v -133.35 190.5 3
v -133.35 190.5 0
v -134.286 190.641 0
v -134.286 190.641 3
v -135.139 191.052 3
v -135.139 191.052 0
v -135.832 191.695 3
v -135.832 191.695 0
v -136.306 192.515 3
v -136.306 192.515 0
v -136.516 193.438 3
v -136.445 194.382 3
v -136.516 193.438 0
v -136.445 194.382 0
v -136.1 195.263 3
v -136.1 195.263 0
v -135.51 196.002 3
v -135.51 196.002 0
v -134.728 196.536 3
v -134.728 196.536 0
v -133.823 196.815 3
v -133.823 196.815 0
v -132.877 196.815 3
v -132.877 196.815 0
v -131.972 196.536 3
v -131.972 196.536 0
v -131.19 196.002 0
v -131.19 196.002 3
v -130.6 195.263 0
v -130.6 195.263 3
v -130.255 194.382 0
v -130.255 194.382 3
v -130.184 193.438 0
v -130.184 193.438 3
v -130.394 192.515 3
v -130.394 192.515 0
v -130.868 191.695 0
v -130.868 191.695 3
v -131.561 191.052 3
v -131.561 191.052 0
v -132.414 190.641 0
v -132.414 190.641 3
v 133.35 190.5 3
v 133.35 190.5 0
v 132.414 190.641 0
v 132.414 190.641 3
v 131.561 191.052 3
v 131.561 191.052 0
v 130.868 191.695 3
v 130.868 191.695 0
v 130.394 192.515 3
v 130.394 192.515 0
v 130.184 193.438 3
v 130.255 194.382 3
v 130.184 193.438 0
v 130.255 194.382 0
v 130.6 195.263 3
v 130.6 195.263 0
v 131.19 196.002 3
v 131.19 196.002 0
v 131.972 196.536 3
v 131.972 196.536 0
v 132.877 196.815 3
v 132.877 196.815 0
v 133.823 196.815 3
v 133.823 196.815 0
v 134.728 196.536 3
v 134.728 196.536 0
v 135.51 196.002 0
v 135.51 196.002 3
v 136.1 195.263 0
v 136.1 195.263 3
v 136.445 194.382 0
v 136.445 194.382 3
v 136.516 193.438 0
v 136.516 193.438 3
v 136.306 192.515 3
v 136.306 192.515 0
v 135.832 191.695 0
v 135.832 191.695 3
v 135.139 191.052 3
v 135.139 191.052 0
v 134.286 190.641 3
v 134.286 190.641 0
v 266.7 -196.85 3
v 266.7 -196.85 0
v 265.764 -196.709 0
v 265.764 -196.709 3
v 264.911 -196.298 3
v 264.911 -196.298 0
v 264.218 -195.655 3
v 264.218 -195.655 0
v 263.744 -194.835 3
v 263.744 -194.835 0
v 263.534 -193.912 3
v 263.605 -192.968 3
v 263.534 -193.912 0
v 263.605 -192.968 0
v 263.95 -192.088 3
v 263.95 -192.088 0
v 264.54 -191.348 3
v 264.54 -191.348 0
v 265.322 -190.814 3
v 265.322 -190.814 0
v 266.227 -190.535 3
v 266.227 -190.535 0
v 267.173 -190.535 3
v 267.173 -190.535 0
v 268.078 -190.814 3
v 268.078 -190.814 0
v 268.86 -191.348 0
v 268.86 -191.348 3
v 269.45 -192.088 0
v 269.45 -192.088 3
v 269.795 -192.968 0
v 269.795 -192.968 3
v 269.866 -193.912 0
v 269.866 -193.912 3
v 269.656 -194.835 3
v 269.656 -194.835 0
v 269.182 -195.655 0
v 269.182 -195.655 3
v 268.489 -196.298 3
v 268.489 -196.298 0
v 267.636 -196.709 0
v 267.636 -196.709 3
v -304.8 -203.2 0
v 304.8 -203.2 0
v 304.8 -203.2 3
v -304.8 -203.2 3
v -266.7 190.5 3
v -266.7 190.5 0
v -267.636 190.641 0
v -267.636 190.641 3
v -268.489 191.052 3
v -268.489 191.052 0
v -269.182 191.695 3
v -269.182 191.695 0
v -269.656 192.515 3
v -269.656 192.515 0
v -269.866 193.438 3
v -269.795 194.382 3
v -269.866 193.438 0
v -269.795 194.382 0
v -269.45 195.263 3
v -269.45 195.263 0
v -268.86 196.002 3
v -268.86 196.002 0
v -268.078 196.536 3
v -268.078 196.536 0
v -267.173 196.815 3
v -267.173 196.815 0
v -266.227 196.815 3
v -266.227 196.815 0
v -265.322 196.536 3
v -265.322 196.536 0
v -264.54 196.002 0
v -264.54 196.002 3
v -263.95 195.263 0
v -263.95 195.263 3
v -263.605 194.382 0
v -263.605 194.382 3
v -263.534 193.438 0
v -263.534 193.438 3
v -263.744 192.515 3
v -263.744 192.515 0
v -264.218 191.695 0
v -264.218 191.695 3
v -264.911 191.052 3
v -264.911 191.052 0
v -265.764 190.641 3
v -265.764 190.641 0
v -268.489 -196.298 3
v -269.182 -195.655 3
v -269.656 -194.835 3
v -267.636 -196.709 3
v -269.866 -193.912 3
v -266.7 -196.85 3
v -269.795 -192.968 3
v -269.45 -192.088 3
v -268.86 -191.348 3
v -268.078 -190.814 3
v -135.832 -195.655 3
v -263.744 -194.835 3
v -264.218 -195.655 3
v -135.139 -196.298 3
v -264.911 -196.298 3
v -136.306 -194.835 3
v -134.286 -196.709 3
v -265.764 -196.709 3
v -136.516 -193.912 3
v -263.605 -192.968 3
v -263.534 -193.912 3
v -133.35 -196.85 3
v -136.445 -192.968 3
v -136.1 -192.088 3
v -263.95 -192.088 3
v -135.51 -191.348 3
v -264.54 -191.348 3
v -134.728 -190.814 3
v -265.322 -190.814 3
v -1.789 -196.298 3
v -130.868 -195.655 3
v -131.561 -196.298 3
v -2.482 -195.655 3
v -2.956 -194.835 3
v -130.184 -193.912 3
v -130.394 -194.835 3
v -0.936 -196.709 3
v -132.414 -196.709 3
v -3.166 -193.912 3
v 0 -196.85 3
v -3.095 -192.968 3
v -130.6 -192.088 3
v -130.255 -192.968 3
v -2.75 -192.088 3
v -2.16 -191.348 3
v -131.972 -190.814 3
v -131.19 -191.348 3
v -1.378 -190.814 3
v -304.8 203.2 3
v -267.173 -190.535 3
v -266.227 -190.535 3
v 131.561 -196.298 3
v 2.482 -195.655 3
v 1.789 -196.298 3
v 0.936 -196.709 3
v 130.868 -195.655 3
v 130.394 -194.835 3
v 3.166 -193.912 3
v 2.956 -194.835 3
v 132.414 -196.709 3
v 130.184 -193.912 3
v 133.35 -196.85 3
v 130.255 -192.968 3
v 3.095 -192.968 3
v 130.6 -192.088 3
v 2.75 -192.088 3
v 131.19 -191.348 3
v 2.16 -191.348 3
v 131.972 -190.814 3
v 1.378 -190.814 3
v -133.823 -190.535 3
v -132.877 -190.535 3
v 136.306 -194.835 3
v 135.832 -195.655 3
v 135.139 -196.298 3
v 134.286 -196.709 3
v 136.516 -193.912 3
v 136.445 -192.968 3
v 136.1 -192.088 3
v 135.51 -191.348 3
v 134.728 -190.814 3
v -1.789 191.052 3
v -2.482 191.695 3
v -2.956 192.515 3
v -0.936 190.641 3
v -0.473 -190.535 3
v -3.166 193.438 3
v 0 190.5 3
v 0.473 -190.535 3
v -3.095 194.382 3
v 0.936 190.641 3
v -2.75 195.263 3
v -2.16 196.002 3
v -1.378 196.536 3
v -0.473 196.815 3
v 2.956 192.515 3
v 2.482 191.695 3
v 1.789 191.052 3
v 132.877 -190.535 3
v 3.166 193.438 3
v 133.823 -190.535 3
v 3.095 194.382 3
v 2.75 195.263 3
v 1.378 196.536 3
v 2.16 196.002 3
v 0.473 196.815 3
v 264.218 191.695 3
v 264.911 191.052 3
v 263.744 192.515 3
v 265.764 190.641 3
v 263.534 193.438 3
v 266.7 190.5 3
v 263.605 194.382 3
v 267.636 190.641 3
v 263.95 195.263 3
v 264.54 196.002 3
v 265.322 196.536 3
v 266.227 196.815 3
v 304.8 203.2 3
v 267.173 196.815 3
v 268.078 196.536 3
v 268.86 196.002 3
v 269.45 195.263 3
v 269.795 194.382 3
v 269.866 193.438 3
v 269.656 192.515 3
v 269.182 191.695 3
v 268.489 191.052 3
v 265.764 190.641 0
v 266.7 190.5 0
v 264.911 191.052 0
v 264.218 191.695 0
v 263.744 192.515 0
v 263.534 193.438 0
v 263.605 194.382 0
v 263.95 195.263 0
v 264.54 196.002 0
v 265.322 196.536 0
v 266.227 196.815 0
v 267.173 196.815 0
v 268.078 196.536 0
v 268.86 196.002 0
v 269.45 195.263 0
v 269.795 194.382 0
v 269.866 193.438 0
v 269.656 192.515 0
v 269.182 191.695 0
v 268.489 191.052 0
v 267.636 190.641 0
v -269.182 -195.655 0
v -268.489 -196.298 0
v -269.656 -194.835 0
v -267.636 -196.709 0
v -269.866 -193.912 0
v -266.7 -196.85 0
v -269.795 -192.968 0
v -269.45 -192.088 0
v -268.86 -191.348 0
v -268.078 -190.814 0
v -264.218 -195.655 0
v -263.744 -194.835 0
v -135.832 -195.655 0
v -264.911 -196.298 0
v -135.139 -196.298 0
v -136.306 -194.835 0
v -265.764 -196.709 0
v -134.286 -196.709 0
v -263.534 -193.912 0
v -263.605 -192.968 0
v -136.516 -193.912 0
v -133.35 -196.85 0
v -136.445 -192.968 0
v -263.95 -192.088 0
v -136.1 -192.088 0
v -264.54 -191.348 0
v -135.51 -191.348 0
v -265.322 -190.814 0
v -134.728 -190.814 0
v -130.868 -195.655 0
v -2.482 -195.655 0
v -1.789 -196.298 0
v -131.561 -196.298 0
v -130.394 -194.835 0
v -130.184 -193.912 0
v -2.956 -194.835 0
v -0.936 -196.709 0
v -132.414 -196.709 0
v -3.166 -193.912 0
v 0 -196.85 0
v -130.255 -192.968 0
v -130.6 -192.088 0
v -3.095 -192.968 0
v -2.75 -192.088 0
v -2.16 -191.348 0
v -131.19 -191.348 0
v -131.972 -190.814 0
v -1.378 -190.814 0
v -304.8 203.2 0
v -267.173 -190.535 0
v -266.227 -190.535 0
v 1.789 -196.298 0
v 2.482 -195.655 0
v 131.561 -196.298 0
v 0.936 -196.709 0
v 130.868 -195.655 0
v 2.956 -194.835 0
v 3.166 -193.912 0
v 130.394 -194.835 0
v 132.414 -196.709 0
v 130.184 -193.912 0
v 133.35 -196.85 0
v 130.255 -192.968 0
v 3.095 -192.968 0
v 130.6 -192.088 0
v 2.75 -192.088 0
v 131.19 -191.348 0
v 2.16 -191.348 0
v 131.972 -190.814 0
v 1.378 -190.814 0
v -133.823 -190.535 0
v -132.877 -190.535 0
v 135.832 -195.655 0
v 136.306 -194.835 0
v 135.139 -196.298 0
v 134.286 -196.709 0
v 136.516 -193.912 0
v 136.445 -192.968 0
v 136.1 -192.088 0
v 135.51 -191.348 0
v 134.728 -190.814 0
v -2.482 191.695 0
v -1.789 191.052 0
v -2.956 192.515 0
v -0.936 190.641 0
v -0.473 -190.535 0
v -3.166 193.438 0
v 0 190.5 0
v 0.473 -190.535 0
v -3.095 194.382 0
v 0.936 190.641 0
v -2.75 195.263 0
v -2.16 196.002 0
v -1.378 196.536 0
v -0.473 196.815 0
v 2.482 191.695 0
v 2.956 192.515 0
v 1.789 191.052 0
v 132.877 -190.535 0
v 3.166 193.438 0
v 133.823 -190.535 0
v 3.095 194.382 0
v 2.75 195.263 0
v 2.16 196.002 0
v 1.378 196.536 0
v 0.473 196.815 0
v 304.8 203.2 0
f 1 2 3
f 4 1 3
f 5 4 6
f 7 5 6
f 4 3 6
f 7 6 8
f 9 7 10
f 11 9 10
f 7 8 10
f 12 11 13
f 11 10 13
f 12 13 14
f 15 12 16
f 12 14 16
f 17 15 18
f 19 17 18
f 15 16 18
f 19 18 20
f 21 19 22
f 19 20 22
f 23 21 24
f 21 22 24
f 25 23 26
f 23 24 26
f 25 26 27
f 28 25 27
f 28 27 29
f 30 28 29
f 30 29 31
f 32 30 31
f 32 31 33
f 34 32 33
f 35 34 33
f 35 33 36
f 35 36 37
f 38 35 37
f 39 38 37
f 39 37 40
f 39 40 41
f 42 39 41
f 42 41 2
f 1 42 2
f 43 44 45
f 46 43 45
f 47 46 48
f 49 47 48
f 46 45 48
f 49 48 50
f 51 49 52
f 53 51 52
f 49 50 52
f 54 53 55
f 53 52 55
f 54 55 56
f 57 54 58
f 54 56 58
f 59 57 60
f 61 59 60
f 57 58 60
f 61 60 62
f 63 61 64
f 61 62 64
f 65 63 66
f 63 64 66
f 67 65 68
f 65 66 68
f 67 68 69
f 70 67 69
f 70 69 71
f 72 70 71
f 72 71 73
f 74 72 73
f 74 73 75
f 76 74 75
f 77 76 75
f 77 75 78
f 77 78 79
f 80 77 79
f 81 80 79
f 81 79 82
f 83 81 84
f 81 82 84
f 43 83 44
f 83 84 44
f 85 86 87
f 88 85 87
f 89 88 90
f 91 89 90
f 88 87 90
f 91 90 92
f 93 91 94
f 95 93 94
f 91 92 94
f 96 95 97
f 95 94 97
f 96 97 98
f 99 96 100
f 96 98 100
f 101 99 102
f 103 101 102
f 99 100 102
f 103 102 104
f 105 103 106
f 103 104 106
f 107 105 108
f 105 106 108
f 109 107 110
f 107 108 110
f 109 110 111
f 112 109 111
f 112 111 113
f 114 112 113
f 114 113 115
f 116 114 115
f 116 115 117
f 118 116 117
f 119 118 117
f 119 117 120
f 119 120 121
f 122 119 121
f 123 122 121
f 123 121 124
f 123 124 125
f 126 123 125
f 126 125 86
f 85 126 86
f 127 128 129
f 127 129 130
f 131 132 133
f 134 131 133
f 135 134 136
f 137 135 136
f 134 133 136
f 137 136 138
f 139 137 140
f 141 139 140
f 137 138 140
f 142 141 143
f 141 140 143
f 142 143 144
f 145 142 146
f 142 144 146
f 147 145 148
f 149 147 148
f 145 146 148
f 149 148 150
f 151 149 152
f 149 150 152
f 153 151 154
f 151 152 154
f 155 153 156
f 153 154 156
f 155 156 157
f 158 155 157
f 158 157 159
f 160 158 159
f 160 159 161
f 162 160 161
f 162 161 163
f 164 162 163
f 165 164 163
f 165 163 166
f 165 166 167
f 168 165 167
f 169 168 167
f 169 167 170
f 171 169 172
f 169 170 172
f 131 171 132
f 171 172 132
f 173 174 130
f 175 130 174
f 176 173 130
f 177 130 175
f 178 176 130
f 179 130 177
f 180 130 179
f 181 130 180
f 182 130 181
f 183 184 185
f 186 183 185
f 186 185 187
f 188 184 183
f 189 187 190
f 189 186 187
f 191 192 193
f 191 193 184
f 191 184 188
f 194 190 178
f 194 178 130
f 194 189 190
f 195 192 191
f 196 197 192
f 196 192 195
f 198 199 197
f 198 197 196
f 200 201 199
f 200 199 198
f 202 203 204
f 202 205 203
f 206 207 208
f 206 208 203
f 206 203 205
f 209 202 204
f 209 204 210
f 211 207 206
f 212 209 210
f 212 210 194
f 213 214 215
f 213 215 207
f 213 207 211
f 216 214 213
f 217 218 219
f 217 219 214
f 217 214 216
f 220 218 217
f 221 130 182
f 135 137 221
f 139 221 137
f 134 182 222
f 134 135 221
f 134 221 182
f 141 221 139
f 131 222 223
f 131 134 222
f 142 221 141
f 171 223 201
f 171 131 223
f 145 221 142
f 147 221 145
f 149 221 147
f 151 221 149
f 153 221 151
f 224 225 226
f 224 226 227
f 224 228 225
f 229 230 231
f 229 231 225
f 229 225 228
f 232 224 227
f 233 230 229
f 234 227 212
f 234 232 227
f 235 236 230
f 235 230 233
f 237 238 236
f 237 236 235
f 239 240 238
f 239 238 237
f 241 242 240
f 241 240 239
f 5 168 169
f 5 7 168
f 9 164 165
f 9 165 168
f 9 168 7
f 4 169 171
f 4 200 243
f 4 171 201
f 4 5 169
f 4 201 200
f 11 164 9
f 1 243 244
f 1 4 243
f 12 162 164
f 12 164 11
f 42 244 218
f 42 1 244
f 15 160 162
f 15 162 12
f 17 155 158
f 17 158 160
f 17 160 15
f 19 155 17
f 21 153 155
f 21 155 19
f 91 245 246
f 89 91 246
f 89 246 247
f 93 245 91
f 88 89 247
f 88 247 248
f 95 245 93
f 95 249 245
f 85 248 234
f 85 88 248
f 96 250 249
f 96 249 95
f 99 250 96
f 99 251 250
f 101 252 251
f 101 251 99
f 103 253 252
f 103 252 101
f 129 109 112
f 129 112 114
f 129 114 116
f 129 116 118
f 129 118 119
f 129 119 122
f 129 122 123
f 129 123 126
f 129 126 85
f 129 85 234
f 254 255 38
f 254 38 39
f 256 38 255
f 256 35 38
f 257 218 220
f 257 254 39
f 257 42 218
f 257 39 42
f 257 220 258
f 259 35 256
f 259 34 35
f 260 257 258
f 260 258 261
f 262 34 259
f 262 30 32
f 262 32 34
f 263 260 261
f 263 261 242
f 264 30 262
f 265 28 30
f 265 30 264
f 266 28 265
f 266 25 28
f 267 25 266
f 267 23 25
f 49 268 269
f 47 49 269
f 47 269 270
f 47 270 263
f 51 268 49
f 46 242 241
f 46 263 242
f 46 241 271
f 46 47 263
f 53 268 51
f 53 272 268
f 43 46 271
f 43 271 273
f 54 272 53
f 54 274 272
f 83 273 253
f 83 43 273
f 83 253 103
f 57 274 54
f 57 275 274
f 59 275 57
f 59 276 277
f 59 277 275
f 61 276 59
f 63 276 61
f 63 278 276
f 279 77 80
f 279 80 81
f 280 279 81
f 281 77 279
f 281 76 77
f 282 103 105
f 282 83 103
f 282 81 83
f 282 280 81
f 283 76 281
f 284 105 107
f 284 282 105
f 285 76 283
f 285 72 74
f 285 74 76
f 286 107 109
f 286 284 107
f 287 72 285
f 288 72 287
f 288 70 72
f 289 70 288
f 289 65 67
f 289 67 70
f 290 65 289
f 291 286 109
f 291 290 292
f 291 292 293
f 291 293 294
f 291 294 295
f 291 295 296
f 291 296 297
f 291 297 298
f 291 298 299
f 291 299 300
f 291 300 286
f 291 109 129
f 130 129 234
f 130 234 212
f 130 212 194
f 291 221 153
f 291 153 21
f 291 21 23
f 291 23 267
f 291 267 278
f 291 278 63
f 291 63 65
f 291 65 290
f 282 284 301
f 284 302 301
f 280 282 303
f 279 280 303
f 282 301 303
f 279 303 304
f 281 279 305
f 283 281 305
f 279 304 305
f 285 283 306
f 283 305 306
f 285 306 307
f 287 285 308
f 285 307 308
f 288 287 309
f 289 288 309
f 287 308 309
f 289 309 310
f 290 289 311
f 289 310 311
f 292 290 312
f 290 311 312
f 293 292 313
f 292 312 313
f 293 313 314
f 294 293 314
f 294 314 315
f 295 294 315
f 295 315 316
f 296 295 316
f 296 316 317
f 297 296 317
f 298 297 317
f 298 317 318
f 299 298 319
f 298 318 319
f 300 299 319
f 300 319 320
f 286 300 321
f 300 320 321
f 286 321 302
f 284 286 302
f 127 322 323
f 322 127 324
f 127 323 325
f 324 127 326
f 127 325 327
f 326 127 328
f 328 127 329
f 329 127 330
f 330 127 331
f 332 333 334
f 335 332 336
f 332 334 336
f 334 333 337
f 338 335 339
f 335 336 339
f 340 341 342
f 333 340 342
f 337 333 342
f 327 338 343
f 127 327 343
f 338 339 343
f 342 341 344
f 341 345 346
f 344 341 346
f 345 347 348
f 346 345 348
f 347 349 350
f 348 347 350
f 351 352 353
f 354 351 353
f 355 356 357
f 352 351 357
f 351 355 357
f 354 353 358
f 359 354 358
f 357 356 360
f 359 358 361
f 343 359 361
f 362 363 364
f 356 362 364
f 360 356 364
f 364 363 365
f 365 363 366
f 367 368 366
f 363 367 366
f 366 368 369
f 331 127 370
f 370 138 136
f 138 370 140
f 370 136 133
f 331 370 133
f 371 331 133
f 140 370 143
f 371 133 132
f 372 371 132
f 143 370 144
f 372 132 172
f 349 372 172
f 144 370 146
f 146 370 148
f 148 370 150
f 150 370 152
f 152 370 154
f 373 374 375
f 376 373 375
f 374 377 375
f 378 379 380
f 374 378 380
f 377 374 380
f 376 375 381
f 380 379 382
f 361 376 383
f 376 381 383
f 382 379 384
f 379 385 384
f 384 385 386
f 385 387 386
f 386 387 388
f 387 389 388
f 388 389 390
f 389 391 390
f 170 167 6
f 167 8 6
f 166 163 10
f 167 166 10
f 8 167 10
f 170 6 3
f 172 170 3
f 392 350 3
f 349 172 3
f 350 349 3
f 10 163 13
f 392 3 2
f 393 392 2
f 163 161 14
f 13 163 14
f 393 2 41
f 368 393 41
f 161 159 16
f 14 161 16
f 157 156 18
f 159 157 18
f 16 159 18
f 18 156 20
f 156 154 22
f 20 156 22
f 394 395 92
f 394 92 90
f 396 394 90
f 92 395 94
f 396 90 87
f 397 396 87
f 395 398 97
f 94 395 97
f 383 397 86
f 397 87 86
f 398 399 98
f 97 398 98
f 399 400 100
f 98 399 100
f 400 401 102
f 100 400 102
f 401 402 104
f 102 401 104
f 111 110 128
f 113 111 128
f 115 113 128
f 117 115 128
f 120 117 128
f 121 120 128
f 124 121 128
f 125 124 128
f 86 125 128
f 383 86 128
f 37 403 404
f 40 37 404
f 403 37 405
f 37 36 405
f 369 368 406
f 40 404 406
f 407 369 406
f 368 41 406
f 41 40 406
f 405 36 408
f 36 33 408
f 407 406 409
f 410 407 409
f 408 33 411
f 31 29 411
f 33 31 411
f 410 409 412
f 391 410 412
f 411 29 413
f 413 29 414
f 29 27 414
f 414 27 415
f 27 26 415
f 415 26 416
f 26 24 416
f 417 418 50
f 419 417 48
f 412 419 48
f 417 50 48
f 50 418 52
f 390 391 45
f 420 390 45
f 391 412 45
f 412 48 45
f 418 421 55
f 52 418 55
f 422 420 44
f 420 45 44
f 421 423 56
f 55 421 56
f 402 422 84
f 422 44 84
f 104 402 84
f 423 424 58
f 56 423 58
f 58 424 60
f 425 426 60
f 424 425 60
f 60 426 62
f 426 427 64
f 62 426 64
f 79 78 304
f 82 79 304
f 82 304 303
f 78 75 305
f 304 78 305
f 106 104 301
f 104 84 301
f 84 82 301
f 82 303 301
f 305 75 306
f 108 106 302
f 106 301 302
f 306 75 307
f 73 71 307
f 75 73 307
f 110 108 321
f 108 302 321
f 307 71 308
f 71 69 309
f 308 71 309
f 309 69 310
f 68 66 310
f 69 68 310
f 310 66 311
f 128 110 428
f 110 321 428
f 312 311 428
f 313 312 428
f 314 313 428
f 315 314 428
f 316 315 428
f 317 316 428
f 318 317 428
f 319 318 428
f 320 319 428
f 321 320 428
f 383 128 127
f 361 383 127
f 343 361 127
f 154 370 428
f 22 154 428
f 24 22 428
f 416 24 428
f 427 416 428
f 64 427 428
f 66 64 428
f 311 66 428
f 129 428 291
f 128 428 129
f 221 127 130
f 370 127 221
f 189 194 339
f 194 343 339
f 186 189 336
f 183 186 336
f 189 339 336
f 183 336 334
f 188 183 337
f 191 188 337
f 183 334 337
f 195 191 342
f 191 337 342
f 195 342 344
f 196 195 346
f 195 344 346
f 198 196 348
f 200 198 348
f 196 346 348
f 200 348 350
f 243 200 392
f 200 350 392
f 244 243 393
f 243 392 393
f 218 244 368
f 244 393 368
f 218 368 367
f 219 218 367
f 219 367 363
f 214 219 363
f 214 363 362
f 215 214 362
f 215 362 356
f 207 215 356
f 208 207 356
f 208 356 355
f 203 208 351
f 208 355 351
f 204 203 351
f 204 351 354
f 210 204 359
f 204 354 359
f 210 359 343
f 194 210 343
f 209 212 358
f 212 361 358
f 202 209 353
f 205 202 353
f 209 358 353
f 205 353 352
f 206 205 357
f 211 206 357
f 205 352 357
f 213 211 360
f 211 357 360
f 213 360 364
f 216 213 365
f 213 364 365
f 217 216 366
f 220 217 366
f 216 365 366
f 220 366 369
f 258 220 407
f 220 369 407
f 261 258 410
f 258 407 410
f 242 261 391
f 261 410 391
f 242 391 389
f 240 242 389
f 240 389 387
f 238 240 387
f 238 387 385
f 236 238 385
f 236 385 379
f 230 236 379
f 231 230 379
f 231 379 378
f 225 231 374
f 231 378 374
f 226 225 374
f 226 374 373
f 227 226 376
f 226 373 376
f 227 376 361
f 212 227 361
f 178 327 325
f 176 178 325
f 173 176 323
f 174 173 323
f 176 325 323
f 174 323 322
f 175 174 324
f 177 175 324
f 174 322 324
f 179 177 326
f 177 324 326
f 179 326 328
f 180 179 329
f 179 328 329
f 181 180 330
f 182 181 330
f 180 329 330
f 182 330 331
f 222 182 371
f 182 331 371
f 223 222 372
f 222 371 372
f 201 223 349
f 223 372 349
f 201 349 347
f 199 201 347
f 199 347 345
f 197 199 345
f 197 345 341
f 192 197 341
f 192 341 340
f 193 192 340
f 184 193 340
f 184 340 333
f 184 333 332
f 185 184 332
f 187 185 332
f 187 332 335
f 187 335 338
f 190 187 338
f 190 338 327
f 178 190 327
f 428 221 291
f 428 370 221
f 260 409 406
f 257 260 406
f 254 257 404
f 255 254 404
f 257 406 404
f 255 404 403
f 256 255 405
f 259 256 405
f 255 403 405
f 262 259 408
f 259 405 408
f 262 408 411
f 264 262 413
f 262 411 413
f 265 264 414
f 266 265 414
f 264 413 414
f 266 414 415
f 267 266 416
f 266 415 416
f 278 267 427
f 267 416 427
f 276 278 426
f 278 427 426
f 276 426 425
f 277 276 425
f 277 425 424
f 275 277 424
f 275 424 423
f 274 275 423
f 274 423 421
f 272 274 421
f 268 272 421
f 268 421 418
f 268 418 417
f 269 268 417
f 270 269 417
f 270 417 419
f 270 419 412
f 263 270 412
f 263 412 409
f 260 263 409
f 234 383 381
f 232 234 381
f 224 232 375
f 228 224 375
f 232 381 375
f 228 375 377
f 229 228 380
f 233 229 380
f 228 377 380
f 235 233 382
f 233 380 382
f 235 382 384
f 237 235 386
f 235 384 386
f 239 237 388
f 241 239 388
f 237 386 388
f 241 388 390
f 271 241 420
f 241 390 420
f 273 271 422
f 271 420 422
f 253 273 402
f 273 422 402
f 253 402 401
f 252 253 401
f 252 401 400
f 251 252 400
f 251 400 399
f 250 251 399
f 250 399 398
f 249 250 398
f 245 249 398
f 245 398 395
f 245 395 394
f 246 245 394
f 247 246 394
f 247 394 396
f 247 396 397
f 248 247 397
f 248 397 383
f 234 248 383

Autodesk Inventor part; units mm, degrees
ref_plane "YZ Plane" through (0, 0, 0) normal (1, 0, 0) x (0, 1, 0)
ref_plane "XZ Plane" through (0, 0, 0) normal (0, 1, 0) x (-1, 0, 0)
ref_plane "XY Plane" through (0, 0, 0) normal (0, 0, 1) x (1, 0, 0)
sketch "Sketch1" plane through (0, 0, 0) normal (0, 0, 1) x (1, 0, 0)
  line L0 (-304.8, 203.2) -> (304.8, 203.2)
  line L1 (304.8, 203.2) -> (304.8, -203.2)
  line L2 (304.8, -203.2) -> (-304.8, -203.2)
  line L3 (-304.8, -203.2) -> (-304.8, 203.2)
  point P0 (0, 0)
  point P1 (0, 203.2)
  point P2 (304.8, 0)
  dimension "d0" = 609.6
  dimension "d1" = 406.4
extrude "Extrusion1" add sketch "Sketch1" along normal blind 3
sketch "Sketch2" plane through (0, 0, 3) normal (0, 0, 1) x (1, 0, 0)
  line L0 (304.8, 203.2) -> (304.8, -203.2) projected
  line L1 (-304.8, -203.2) -> (-304.8, 203.2) projected
  line L2 (304.8, -203.2) -> (-304.8, -203.2) projected
  line L3 (-304.8, 0) -> (304.8, 0)
  point P0 (0, 0)
  point P1 (-266.7, -193.675)
  point P2 (-133.35, -193.675)
  point P3 (0, -193.675)
  point P4 (133.35, -193.675)
  point P5 (266.7, -193.675)
  point P6 (-266.7, 193.675)
  point P7 (-133.35, 193.675)
  point P8 (0, 193.675)
  point P9 (133.35, 193.675)
  point P10 (266.7, 193.675)
  dimension "d4" = 9.525
  dimension "d5" = 133.35
  dimension "d6" = 38.1
  dimension "d7" = 133.35
  dimension "d8" = 133.35
  dimension "d9" = 133.35
  dimension "d10" = 38.1
hole "Hole1" at (-266.7, -193.675, 3) at (-133.35, -193.675, 3) at (0, -193.675, 3) at (133.35, -193.675, 3) at (266.7, -193.675, 3) at (-266.7, 193.675, 3) at (-133.35, 193.675, 3) at (0, 193.675, 3) at (133.35, 193.675, 3) at (266.7, 193.675, 3) direction (0, 0, -1) diameter 6.35 end through all
properties part number "top"
